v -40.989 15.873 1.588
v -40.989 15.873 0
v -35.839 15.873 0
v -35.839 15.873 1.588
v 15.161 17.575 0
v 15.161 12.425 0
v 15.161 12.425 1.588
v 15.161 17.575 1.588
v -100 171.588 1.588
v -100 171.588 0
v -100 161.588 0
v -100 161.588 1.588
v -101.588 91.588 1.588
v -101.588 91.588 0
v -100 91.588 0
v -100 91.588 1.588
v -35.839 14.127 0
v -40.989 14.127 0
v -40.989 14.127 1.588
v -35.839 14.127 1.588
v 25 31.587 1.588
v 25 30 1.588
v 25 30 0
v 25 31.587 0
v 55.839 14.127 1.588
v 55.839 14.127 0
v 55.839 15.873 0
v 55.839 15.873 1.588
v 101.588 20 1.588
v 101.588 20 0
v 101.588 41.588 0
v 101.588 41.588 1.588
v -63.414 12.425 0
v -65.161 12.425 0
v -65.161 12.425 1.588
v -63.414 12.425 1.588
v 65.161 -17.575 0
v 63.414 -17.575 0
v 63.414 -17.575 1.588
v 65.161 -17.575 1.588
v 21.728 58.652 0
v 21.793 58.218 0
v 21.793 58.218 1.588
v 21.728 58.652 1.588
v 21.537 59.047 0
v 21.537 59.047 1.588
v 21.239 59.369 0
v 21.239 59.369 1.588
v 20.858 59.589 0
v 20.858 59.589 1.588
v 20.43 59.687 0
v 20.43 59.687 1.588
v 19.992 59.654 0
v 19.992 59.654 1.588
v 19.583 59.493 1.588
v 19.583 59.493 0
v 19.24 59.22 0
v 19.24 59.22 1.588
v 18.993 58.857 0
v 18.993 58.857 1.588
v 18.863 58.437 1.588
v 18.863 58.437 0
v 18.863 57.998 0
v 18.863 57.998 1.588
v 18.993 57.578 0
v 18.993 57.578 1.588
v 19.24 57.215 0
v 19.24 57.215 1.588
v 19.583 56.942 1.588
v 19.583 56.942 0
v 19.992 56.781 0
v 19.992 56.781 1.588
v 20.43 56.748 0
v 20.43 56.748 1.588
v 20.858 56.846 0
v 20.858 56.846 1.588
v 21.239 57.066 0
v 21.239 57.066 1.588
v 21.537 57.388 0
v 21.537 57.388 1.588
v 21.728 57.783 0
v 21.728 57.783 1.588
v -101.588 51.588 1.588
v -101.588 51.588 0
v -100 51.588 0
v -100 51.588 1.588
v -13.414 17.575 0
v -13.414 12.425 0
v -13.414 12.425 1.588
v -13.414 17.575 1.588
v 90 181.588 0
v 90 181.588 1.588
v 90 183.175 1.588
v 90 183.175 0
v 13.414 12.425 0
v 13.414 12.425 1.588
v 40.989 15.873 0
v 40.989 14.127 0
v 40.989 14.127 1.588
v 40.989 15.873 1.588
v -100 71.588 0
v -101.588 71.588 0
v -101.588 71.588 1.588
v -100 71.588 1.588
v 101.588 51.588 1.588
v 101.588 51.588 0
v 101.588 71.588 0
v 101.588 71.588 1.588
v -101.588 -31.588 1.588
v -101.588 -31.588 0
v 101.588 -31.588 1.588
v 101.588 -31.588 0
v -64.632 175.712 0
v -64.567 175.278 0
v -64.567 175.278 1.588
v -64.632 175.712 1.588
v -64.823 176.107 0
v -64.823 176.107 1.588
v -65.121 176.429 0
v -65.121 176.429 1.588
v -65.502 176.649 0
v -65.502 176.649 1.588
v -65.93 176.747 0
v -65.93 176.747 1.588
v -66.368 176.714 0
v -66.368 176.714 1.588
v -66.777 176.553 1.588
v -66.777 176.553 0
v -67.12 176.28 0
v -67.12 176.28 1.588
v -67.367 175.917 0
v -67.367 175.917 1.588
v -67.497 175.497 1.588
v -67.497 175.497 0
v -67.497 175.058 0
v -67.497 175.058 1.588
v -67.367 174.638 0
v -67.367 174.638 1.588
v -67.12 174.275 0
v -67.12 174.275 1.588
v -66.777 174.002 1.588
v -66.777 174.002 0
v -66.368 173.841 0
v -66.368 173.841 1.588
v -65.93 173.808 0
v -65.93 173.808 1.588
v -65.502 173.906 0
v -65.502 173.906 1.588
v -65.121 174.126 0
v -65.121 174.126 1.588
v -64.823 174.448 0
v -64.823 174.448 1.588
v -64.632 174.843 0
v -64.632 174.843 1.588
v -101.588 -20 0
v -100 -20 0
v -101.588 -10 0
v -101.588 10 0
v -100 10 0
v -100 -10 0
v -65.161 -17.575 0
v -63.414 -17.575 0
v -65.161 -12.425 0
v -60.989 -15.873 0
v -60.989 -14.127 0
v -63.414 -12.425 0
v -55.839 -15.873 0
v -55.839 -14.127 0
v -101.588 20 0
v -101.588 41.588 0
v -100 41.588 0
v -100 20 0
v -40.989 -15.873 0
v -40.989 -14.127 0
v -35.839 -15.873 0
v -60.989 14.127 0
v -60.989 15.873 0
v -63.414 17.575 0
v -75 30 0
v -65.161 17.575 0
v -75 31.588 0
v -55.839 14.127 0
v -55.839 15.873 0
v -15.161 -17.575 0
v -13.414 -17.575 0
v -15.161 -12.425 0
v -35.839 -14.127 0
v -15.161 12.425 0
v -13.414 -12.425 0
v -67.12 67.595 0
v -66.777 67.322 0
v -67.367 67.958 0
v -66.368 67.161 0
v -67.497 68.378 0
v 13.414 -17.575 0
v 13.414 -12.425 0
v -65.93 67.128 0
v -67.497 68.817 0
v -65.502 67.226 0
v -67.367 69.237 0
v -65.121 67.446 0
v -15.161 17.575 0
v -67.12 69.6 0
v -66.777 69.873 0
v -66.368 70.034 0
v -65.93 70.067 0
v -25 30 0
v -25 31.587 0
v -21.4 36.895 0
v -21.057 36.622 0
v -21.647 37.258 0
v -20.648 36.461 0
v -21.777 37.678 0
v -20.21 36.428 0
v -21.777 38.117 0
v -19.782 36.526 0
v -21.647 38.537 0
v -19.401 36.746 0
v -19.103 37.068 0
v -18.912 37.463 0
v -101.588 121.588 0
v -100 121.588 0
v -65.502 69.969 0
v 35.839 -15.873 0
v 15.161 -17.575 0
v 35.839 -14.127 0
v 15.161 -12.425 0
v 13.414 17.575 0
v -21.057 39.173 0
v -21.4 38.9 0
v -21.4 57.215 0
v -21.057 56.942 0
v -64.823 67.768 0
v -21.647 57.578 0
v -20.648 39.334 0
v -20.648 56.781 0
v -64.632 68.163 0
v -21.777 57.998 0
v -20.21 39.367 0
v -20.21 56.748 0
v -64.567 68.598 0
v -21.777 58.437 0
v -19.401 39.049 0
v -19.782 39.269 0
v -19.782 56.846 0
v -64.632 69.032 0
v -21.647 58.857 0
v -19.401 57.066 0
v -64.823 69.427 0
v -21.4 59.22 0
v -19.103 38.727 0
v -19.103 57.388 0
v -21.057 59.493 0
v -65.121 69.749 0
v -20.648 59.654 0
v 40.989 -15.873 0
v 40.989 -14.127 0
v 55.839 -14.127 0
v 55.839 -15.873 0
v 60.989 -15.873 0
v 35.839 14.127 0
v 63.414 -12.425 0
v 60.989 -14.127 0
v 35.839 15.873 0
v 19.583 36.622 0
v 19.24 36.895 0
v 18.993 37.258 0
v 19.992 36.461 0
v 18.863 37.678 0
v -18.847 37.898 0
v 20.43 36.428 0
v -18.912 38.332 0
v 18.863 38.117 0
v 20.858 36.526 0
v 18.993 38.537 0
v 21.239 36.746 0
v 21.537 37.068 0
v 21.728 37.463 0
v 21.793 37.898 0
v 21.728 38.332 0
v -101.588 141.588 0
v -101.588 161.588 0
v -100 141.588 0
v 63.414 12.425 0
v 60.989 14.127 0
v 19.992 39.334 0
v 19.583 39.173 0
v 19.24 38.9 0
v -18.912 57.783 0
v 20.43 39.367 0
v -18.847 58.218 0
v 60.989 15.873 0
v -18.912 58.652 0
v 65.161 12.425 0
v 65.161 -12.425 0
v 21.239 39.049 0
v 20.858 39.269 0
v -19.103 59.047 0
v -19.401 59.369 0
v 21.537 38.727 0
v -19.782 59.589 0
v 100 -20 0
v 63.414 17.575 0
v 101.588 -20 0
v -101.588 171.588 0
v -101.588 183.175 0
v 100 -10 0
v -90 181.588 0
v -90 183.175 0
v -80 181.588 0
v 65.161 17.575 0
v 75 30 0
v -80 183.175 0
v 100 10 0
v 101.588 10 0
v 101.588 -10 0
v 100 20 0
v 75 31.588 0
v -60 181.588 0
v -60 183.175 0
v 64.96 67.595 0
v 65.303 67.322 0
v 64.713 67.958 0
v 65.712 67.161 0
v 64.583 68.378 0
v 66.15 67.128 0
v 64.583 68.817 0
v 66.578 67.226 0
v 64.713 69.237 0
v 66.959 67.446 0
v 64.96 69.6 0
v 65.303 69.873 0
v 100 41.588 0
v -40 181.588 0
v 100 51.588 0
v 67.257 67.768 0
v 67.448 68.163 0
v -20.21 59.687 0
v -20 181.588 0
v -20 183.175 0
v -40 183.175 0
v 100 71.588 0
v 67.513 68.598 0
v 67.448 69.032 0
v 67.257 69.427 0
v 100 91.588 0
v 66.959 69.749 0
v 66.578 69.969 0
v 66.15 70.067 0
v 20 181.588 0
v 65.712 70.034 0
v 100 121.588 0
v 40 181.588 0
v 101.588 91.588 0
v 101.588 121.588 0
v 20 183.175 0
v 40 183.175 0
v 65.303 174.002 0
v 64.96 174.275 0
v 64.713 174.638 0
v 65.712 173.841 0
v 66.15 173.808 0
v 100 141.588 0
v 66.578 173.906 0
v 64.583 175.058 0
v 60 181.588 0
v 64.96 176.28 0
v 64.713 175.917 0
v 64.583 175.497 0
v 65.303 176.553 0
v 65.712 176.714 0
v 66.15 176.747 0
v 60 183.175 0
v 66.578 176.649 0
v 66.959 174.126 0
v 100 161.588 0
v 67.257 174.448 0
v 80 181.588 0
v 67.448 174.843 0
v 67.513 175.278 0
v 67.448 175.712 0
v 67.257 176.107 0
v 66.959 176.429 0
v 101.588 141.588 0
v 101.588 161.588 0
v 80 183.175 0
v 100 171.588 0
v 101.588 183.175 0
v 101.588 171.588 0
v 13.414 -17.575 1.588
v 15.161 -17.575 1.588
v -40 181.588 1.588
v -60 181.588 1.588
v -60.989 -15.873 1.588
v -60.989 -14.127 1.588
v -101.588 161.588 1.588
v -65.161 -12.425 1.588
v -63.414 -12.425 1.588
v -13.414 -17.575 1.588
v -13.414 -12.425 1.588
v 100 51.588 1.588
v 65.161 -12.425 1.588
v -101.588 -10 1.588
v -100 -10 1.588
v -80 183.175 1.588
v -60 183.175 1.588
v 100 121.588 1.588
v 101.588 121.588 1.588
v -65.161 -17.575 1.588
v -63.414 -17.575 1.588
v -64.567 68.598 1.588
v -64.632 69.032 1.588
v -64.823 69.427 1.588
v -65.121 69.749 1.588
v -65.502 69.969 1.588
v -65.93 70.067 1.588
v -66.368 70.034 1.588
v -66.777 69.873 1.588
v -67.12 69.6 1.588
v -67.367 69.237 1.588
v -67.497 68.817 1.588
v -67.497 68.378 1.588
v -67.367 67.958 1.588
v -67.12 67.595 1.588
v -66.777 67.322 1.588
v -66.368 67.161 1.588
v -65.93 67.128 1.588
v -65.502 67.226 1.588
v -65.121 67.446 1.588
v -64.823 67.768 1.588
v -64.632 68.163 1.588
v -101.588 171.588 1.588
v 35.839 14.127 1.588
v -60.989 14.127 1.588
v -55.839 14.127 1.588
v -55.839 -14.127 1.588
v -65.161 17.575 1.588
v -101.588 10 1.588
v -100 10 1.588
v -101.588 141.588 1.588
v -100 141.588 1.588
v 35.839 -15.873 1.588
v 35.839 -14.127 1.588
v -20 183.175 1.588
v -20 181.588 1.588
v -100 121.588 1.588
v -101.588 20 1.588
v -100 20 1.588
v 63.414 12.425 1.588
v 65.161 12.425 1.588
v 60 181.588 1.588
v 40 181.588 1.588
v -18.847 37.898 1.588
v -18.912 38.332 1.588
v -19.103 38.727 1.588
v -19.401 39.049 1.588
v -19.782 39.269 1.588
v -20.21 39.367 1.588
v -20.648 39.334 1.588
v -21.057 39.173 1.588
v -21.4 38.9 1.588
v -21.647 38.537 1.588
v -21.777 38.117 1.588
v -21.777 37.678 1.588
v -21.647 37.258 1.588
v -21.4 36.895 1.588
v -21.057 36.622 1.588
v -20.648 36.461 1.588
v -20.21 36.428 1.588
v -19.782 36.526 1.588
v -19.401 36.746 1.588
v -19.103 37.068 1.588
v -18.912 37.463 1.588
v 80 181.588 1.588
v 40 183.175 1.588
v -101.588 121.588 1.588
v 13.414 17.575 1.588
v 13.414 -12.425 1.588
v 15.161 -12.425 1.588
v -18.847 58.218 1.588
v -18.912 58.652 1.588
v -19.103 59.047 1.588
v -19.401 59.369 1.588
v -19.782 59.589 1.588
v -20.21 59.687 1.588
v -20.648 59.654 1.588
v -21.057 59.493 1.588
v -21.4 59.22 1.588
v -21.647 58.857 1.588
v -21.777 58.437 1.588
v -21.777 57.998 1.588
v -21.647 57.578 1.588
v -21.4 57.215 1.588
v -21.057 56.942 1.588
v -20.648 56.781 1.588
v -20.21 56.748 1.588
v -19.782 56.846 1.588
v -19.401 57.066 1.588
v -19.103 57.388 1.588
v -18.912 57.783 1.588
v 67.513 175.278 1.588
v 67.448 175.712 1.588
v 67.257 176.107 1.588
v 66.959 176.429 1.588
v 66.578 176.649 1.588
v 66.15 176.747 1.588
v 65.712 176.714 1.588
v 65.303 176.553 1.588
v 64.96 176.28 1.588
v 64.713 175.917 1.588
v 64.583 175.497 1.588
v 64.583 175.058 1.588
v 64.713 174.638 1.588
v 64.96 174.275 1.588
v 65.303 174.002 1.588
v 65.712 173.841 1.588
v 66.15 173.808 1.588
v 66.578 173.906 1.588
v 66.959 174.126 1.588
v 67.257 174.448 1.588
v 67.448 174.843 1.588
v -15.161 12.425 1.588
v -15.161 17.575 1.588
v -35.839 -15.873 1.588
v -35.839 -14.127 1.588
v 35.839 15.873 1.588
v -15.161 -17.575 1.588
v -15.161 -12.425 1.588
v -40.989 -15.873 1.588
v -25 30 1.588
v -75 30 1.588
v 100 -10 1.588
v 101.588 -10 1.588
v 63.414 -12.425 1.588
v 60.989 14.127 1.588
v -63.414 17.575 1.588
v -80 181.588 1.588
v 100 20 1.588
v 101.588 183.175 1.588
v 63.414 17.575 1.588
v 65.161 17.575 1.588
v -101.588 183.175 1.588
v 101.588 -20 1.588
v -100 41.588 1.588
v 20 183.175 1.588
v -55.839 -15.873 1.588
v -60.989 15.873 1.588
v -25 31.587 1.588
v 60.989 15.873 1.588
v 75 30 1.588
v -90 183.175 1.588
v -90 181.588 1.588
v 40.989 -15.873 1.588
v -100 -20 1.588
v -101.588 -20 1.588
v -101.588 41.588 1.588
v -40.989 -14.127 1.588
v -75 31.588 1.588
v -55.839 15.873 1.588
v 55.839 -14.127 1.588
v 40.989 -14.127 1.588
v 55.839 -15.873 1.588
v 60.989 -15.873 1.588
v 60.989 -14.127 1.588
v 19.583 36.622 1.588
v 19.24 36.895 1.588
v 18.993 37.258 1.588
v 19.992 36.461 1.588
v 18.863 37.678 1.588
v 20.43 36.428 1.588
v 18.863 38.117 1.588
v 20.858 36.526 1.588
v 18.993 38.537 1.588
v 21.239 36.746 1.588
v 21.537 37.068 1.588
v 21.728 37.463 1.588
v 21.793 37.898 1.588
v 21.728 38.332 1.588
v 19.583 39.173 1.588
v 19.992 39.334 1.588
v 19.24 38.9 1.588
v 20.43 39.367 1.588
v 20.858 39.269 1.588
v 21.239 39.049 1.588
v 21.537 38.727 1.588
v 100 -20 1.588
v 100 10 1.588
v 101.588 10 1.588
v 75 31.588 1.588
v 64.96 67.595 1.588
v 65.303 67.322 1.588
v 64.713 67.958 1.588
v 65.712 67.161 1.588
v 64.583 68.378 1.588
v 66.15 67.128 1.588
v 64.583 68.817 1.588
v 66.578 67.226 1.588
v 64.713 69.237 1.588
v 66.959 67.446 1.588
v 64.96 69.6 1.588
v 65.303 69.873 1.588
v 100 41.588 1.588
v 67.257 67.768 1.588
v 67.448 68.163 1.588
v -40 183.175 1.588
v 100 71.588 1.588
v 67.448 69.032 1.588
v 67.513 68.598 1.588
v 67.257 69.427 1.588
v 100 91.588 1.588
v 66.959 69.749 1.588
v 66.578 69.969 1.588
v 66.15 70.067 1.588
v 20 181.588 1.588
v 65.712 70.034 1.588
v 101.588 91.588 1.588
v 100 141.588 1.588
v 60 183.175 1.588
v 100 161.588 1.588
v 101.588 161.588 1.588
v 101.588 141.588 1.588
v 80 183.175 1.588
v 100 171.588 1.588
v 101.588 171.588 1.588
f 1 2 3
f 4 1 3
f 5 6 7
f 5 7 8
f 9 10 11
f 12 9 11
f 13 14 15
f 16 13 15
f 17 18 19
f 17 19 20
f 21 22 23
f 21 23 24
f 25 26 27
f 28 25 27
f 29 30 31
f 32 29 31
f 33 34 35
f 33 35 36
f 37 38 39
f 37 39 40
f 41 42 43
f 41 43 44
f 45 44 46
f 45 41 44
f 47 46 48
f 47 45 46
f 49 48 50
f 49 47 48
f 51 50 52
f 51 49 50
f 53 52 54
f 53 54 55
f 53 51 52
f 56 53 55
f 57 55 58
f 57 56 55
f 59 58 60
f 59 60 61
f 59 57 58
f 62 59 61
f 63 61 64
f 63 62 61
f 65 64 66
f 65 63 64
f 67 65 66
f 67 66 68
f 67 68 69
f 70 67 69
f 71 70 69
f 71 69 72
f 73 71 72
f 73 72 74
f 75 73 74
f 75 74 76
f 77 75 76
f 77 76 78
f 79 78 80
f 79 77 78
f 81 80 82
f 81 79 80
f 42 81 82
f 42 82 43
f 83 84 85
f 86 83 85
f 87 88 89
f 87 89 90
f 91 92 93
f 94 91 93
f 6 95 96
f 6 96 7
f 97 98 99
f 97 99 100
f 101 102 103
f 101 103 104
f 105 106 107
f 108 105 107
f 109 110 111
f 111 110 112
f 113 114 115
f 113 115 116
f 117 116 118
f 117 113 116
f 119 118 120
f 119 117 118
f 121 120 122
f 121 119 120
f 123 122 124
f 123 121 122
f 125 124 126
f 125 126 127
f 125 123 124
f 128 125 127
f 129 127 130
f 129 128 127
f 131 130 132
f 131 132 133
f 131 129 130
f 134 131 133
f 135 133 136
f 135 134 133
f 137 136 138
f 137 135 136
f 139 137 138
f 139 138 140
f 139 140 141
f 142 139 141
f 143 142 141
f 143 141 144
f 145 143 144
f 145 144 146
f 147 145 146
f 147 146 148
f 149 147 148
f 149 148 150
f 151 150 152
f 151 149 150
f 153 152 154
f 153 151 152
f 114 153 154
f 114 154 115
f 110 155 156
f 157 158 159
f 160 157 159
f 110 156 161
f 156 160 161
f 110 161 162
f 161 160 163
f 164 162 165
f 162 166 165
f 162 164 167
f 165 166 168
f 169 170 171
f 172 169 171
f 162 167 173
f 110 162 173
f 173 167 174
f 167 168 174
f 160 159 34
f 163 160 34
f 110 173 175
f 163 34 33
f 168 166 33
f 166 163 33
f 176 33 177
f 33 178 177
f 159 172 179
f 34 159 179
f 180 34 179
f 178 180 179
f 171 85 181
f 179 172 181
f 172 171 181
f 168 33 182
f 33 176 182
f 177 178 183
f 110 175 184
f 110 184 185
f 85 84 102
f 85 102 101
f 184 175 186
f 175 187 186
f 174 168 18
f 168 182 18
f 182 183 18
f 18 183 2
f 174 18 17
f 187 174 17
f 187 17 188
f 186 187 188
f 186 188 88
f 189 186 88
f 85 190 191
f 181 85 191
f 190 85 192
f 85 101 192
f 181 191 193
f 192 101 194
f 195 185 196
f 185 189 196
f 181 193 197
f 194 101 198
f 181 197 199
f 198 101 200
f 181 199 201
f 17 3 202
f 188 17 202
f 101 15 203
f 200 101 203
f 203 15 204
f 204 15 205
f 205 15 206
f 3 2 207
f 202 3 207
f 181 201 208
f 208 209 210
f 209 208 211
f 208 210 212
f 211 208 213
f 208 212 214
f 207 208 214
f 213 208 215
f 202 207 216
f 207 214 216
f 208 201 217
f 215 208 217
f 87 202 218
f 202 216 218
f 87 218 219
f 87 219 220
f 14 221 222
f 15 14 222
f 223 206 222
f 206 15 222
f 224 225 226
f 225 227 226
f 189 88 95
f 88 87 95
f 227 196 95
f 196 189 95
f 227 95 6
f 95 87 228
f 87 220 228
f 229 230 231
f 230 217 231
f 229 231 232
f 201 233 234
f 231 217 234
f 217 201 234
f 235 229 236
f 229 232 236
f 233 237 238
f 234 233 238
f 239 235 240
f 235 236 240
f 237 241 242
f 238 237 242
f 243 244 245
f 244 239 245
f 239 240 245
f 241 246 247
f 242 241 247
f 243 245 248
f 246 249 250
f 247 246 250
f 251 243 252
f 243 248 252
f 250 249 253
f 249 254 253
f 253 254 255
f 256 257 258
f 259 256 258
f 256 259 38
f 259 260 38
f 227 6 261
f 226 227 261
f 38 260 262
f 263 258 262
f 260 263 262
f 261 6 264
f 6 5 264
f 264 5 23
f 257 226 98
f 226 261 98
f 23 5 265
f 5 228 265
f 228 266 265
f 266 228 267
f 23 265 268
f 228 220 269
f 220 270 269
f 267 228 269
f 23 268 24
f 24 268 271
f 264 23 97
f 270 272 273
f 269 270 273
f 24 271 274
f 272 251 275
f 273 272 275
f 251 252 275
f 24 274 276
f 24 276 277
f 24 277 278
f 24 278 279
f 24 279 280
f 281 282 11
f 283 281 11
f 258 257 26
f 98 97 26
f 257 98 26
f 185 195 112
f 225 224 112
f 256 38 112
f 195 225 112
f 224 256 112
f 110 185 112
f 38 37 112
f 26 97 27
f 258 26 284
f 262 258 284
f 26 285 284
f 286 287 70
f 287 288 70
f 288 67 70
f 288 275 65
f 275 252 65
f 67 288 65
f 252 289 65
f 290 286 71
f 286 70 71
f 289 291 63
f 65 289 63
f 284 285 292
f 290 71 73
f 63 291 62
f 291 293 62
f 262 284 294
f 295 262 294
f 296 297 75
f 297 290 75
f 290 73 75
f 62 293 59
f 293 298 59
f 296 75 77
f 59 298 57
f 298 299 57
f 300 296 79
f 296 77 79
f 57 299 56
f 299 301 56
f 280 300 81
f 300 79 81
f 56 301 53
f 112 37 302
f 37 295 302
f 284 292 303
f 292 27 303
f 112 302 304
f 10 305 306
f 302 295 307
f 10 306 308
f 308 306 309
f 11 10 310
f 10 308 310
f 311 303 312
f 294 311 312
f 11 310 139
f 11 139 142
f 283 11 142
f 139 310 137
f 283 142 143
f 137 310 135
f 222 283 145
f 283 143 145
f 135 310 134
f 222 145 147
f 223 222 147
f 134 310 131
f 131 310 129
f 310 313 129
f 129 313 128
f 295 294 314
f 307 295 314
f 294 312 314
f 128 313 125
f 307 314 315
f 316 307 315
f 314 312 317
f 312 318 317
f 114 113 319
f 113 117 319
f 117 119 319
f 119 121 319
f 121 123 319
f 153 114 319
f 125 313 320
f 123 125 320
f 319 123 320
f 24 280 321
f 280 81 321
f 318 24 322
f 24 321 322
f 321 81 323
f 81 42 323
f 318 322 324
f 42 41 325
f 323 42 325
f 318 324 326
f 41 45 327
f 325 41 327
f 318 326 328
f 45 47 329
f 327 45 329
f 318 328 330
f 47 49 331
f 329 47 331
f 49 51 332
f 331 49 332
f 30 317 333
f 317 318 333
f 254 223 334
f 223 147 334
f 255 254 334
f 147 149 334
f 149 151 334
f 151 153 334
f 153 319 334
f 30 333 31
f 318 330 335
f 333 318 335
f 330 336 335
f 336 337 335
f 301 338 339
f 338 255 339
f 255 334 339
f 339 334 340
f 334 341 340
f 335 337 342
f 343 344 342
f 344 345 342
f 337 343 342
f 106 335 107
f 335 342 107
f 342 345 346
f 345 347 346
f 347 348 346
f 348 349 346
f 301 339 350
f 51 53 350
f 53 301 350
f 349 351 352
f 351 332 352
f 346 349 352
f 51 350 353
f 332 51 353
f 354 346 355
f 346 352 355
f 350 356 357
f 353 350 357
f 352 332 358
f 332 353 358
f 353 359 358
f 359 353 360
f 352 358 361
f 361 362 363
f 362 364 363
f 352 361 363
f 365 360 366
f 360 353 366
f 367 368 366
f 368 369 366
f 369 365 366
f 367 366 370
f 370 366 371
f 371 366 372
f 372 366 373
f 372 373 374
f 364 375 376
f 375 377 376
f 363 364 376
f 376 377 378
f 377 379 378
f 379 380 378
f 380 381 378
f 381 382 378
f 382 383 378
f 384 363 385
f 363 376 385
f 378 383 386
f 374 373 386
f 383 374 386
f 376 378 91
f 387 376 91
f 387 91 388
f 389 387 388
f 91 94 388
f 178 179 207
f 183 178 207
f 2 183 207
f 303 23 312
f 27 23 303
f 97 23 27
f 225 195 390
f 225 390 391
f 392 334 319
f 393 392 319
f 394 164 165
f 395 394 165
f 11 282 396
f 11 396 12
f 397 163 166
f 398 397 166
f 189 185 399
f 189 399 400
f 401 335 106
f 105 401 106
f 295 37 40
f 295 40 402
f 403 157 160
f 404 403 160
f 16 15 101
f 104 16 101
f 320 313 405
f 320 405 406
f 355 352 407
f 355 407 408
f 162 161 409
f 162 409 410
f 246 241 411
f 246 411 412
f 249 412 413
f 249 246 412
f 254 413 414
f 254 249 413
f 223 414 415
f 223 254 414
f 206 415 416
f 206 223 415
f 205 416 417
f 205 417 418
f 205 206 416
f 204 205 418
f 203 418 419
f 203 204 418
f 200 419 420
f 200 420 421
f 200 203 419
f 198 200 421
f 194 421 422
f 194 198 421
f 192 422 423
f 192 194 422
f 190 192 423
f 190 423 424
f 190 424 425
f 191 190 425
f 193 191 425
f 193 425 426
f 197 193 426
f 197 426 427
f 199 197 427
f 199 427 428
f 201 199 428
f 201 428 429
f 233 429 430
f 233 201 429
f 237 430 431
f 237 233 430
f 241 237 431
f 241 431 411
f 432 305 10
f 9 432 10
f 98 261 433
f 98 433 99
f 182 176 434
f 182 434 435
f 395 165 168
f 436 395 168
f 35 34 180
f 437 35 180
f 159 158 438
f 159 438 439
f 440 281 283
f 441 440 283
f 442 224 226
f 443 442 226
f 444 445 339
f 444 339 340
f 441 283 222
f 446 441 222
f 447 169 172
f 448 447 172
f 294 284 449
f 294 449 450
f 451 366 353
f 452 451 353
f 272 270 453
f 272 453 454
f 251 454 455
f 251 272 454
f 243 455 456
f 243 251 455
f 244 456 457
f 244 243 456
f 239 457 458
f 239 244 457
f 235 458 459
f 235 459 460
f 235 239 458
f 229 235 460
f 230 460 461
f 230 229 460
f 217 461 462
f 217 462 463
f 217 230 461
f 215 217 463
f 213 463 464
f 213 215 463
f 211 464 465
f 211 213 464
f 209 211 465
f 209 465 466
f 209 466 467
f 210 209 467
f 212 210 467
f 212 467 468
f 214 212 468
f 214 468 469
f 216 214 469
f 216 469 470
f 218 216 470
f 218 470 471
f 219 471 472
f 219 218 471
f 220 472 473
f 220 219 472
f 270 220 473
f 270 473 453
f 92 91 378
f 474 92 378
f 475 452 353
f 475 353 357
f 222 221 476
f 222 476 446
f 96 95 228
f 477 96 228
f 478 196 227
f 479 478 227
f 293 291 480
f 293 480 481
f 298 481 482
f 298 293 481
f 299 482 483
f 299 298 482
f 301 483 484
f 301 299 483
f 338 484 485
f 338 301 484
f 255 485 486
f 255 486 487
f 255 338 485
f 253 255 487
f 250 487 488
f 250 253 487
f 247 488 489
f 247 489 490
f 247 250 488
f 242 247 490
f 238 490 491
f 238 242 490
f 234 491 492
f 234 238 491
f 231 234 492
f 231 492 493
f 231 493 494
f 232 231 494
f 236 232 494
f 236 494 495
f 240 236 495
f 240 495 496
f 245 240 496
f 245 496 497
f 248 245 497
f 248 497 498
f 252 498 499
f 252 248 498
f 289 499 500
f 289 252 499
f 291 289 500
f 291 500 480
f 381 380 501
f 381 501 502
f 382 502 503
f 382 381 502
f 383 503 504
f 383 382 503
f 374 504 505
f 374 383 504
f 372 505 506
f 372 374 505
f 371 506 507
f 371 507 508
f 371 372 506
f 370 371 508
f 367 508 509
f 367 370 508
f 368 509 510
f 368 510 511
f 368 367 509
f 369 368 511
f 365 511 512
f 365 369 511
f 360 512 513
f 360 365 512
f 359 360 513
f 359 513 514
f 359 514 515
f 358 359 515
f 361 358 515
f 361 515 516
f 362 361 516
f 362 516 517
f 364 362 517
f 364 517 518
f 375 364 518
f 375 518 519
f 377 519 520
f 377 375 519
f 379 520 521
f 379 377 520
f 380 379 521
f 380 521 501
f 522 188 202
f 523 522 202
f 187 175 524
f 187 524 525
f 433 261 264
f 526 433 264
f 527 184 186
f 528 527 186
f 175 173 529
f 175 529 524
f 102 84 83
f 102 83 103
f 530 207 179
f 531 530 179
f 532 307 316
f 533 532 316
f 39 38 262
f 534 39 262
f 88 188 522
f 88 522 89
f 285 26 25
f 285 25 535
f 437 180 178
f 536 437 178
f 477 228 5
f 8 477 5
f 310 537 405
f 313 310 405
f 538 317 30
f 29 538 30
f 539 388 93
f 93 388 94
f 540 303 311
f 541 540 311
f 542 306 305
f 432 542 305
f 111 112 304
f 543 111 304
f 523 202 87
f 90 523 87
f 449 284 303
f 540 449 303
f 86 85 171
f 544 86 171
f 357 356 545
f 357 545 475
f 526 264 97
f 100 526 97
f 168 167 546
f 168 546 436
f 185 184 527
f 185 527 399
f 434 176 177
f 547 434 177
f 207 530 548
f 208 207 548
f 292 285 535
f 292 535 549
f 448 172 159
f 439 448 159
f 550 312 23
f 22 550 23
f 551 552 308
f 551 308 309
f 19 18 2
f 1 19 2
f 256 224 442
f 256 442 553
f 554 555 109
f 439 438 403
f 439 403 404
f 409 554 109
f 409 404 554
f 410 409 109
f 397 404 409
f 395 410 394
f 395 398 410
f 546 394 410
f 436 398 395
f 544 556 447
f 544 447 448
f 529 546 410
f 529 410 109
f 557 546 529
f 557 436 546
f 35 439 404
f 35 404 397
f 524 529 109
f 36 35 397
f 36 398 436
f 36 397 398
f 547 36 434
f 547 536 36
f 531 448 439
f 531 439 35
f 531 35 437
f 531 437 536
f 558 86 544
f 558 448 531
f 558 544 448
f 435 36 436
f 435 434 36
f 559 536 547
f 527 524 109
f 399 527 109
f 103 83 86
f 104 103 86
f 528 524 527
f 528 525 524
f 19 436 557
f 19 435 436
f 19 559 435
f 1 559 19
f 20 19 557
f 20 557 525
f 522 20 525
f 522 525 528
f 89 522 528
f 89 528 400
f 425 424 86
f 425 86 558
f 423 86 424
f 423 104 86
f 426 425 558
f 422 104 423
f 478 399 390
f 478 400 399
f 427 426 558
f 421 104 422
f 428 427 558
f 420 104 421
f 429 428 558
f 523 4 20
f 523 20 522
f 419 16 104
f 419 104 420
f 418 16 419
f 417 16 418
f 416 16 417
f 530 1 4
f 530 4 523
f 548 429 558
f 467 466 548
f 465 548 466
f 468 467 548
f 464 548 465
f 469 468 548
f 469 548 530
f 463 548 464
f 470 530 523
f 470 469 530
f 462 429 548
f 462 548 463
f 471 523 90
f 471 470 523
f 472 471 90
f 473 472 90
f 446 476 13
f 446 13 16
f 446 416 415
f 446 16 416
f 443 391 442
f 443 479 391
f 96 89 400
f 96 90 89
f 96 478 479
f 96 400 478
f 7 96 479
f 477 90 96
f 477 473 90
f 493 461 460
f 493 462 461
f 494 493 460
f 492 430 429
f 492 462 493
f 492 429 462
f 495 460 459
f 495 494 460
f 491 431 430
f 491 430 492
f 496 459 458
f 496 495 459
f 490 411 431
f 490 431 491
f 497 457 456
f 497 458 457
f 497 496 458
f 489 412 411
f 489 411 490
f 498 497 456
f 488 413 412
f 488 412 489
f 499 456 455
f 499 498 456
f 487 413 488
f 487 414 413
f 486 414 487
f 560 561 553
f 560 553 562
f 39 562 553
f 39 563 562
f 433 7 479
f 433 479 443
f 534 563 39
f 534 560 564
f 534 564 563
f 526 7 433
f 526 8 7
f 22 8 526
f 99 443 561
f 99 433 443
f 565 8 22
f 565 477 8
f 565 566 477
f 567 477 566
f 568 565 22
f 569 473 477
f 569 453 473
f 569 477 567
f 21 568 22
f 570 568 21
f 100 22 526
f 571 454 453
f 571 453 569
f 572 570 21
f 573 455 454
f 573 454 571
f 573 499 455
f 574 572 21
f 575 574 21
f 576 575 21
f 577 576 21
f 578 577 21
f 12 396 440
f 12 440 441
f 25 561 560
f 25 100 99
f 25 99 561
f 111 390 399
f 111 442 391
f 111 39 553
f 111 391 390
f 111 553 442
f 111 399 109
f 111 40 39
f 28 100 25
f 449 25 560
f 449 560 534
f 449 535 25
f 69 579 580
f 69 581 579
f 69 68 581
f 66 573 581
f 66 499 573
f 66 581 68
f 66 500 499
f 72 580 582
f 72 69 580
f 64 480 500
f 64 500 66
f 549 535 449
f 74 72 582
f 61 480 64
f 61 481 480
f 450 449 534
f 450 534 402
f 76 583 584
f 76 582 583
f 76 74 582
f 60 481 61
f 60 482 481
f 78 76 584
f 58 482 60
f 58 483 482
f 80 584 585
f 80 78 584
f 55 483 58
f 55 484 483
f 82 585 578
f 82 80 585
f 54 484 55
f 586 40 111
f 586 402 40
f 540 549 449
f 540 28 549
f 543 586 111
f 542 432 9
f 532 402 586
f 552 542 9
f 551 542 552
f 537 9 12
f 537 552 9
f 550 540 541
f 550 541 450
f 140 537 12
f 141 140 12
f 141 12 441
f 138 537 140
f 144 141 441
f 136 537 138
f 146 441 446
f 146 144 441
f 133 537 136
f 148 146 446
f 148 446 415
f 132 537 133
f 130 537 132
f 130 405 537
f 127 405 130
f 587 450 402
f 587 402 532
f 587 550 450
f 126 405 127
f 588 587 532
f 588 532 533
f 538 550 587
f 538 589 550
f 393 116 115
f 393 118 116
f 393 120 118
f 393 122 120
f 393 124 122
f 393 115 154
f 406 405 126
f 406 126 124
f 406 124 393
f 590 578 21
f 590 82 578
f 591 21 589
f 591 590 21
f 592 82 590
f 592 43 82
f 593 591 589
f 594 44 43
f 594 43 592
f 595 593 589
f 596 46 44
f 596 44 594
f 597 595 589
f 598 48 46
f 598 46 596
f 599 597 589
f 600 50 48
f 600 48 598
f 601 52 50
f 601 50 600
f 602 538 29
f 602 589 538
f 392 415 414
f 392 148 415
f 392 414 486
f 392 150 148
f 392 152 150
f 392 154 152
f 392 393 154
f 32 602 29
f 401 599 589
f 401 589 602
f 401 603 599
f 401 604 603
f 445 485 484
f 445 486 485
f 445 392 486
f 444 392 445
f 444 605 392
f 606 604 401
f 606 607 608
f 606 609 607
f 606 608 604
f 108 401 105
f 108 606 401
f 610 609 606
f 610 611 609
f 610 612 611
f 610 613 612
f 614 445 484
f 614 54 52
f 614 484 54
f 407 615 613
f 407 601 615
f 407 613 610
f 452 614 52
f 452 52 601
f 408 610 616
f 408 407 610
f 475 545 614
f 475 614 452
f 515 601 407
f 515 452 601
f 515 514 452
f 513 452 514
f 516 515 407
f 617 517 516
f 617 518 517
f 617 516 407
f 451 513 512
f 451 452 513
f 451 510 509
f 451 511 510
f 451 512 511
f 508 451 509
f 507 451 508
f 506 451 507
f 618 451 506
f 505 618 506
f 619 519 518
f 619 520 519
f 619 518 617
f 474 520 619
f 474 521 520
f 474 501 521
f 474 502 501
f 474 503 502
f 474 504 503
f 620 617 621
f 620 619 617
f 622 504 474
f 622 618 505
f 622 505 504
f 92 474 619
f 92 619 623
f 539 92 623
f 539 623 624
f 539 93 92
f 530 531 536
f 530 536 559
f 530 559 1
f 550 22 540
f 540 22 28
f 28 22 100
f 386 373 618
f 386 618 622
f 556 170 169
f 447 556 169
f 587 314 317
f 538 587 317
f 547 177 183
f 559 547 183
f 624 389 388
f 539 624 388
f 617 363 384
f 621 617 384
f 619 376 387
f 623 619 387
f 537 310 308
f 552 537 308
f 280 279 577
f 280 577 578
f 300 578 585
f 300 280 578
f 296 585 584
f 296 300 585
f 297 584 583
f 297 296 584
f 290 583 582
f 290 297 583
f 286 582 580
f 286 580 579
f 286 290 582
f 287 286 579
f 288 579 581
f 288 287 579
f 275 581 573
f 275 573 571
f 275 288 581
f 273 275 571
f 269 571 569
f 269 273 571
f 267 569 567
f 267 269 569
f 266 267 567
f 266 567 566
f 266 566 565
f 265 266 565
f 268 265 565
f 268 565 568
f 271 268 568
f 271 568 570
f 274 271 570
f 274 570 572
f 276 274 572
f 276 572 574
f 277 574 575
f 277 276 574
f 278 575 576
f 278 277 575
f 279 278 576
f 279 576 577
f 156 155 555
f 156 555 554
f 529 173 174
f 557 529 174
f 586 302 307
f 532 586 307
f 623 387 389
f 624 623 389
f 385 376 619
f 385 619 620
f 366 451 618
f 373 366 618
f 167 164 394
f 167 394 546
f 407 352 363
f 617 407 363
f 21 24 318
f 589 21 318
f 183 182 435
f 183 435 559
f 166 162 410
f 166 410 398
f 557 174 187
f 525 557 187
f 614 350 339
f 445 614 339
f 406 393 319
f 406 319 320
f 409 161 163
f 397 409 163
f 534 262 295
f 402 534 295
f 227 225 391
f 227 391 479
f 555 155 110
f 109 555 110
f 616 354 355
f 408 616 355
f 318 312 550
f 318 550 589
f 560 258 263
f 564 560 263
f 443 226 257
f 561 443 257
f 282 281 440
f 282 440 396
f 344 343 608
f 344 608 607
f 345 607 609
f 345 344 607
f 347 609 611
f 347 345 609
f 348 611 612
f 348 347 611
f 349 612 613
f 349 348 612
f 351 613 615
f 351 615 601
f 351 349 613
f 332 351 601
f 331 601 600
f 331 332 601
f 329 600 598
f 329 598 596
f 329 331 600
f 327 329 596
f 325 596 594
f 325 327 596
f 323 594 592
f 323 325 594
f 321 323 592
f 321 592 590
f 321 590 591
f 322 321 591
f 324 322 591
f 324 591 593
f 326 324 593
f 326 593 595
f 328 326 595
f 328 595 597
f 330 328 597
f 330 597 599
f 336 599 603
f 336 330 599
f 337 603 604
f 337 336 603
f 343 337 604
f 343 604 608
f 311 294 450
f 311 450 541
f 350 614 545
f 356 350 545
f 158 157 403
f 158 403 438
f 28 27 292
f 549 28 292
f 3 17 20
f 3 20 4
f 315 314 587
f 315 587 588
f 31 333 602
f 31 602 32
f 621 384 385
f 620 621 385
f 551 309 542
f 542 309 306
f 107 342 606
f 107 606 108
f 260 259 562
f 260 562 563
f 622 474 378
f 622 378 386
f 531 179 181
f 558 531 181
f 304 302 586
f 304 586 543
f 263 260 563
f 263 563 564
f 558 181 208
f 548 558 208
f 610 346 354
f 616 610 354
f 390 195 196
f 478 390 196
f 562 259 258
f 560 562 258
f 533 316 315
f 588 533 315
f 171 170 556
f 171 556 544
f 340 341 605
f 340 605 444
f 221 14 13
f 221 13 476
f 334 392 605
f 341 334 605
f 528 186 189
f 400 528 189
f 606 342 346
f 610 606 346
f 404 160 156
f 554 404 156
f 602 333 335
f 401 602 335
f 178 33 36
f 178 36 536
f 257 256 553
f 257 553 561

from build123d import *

# Parameters (mm, degrees)
F0_W     = 1.5875
F0_H     = 10
F0_H_2   = 20
F0_W_2   = 1.74625
F0_H_3   = 5.15
F0_W_3   = 5.15
F0_H_4   = 1.74625
F0_W_4   = 200
F0_H_5   = 1.5875
F0_W_5   = 50
F0_R     = 1.4732
F0_W_6   = 25
F0_H_6   = 30
F0_W_7   = 10
F0_W_8   = 20
F1_DEPTH = 1.5875


# Not quite as in the source:
# - a length typed as a fraction of an inch, garbled in the dataset ("3 / 203.2 mm" for 3/8 in), is restored


with BuildPart() as f1:
    # F0 (on Top) → F1 (new body)
    with BuildSketch(Plane.XY):
        with Locations((-100.79375, 176.5875)):
            Rectangle(F0_W, F0_H)
        with Locations((-100.79375, 36.5875)):
            Rectangle(F0_W, F0_H)
        with Locations((-100.79375, 61.5875)):
            Rectangle(F0_W, F0_H_2)
        with Locations((100.79375, 176.5875)):
            Rectangle(F0_W, F0_H)
        with Locations((100.79375, 36.5875)):
            Rectangle(F0_W, F0_H)
        with Locations((100.79375, 61.5875)):
            Rectangle(F0_W, F0_H_2)
        Polygon((100, 10), (100, 20), (-100, 20), (-100, 10), (-100, -10), (-100, -20), (100, -20), (100, -10), align=None)
        with Locations((-64.2875, -15)):
            Rectangle(F0_W_2, F0_H_3, mode=Mode.SUBTRACT)
        with Locations((-58.414375, -15)):
            Rectangle(F0_W_3, F0_H_4, mode=Mode.SUBTRACT)
        with Locations((-64.2875, 15)):
            Rectangle(F0_W_2, F0_H_3, mode=Mode.SUBTRACT)
        with Locations((-58.414375, 15)):
            Rectangle(F0_W_3, F0_H_4, mode=Mode.SUBTRACT)
        with Locations((-38.414375, -15)):
            Rectangle(F0_W_3, F0_H_4, mode=Mode.SUBTRACT)
        with Locations((-14.2875, -15)):
            Rectangle(F0_W_2, F0_H_3, mode=Mode.SUBTRACT)
        with Locations((-38.414375, 15)):
            Rectangle(F0_W_3, F0_H_4, mode=Mode.SUBTRACT)
        with Locations((-14.2875, 15)):
            Rectangle(F0_W_2, F0_H_3, mode=Mode.SUBTRACT)
        with Locations((14.2875, -15)):
            Rectangle(F0_W_2, F0_H_3, mode=Mode.SUBTRACT)
        with Locations((38.414375, -15)):
            Rectangle(F0_W_3, F0_H_4, mode=Mode.SUBTRACT)
        with Locations((14.2875, 15)):
            Rectangle(F0_W_2, F0_H_3, mode=Mode.SUBTRACT)
        with Locations((38.414375, 15)):
            Rectangle(F0_W_3, F0_H_4, mode=Mode.SUBTRACT)
        with Locations((58.414375, -15)):
            Rectangle(F0_W_3, F0_H_4, mode=Mode.SUBTRACT)
        with Locations((64.2875, -15)):
            Rectangle(F0_W_2, F0_H_3, mode=Mode.SUBTRACT)
        with Locations((58.414375, 15)):
            Rectangle(F0_W_3, F0_H_4, mode=Mode.SUBTRACT)
        with Locations((64.2875, 15)):
            Rectangle(F0_W_2, F0_H_3, mode=Mode.SUBTRACT)
        Polygon((-100, 20), (100, 20), (100, 30), (75, 30), (25, 30), (-25, 30), (-75, 30), (-100, 30), align=None)
        with Locations((0, -25)):
            Rectangle(F0_W_4, F0_H)
        with Locations((-100.79375, 0)):
            Rectangle(F0_W, F0_H_2)
        with Locations((100.79375, 0)):
            Rectangle(F0_W, F0_H_2)
        with Locations((100.79375, 25)):
            Rectangle(F0_W, F0_H)
        with Locations((100.79375, -25)):
            Rectangle(F0_W, F0_H)
        with Locations((-100.79375, 25)):
            Rectangle(F0_W, F0_H)
        with Locations((-100.79375, -25)):
            Rectangle(F0_W, F0_H)
        Polygon((101.5875, -30), (100, -30), (-100, -30), (-100, -31.5875), (101.5875, -31.5875), align=None)
        with Locations((-100.79375, 30.79375)):
            Rectangle(F0_W, F0_H_5)
        with Locations((0, 30.79375)):
            Rectangle(F0_W_5, F0_H_5)
        with Locations((100.79375, 30.79375)):
            Rectangle(F0_W, F0_H_5)
        with Locations((-100.79375, -30.79375)):
            Rectangle(F0_W, F0_H_5)
        Polygon((75, 31.5875), (100, 31.5875), (100, 41.5875), (100, 51.5875), (100, 71.5875), (100, 91.5875), (100, 121.5875), (100, 141.5875), (100, 161.5875), (100, 171.5875), (100, 181.5875), (90, 181.5875), (80, 181.5875), (60, 181.5875), (40, 181.5875), (20, 181.5875), (-20, 181.5875), (-40, 181.5875), (-60, 181.5875), (-80, 181.5875), (-90, 181.5875), (-100, 181.5875), (-100, 171.5875), (-100, 161.5875), (-100, 141.5875), (-100, 121.5875), (-100, 91.5875), (-100, 71.5875), (-100, 51.5875), (-100, 41.5875), (-100, 31.5875), (-75, 31.5875), (-25, 31.5875), (25, 31.5875), align=None)
        with Locations((-66.04, 68.5975)):
            Circle(F0_R, mode=Mode.SUBTRACT)
        with Locations((-20.32, 37.8975)):
            Circle(F0_R, mode=Mode.SUBTRACT)
        with Locations((-20.32, 58.2175)):
            Circle(F0_R, mode=Mode.SUBTRACT)
        with Locations((20.32, 37.8975)):
            Circle(F0_R, mode=Mode.SUBTRACT)
        with Locations((20.32, 58.2175)):
            Circle(F0_R, mode=Mode.SUBTRACT)
        with Locations((66.04, 68.5975)):
            Circle(F0_R, mode=Mode.SUBTRACT)
        with Locations((-66.04, 175.2775)):
            Circle(F0_R, mode=Mode.SUBTRACT)
        with Locations((66.04, 175.2775)):
            Circle(F0_R, mode=Mode.SUBTRACT)
        with Locations((87.5, 30.79375)):
            Rectangle(F0_W_6, F0_H_5)
        with Locations((-87.5, 30.79375)):
            Rectangle(F0_W_6, F0_H_5)
        with Locations((-100.79375, 106.5875)):
            Rectangle(F0_W, F0_H_6)
        with Locations((-100.79375, 151.5875)):
            Rectangle(F0_W, F0_H_2)
        with Locations((100.79375, 151.5875)):
            Rectangle(F0_W, F0_H_2)
        with Locations((100.79375, 106.5875)):
            Rectangle(F0_W, F0_H_6)
        with Locations((95, 182.38125)):
            Rectangle(F0_W_7, F0_H_5)
        with Locations((100.79375, 182.38125)):
            Rectangle(F0_W, F0_H_5)
        with Locations((-100.79375, 182.38125)):
            Rectangle(F0_W, F0_H_5)
        with Locations((-95, 182.38125)):
            Rectangle(F0_W_7, F0_H_5)
        with Locations((-70, 182.38125)):
            Rectangle(F0_W_8, F0_H_5)
        with Locations((-30, 182.38125)):
            Rectangle(F0_W_8, F0_H_5)
        with Locations((70, 182.38125)):
            Rectangle(F0_W_8, F0_H_5)
        with Locations((30, 182.38125)):
            Rectangle(F0_W_8, F0_H_5)
    extrude(amount=F1_DEPTH)


solid = f1.part
